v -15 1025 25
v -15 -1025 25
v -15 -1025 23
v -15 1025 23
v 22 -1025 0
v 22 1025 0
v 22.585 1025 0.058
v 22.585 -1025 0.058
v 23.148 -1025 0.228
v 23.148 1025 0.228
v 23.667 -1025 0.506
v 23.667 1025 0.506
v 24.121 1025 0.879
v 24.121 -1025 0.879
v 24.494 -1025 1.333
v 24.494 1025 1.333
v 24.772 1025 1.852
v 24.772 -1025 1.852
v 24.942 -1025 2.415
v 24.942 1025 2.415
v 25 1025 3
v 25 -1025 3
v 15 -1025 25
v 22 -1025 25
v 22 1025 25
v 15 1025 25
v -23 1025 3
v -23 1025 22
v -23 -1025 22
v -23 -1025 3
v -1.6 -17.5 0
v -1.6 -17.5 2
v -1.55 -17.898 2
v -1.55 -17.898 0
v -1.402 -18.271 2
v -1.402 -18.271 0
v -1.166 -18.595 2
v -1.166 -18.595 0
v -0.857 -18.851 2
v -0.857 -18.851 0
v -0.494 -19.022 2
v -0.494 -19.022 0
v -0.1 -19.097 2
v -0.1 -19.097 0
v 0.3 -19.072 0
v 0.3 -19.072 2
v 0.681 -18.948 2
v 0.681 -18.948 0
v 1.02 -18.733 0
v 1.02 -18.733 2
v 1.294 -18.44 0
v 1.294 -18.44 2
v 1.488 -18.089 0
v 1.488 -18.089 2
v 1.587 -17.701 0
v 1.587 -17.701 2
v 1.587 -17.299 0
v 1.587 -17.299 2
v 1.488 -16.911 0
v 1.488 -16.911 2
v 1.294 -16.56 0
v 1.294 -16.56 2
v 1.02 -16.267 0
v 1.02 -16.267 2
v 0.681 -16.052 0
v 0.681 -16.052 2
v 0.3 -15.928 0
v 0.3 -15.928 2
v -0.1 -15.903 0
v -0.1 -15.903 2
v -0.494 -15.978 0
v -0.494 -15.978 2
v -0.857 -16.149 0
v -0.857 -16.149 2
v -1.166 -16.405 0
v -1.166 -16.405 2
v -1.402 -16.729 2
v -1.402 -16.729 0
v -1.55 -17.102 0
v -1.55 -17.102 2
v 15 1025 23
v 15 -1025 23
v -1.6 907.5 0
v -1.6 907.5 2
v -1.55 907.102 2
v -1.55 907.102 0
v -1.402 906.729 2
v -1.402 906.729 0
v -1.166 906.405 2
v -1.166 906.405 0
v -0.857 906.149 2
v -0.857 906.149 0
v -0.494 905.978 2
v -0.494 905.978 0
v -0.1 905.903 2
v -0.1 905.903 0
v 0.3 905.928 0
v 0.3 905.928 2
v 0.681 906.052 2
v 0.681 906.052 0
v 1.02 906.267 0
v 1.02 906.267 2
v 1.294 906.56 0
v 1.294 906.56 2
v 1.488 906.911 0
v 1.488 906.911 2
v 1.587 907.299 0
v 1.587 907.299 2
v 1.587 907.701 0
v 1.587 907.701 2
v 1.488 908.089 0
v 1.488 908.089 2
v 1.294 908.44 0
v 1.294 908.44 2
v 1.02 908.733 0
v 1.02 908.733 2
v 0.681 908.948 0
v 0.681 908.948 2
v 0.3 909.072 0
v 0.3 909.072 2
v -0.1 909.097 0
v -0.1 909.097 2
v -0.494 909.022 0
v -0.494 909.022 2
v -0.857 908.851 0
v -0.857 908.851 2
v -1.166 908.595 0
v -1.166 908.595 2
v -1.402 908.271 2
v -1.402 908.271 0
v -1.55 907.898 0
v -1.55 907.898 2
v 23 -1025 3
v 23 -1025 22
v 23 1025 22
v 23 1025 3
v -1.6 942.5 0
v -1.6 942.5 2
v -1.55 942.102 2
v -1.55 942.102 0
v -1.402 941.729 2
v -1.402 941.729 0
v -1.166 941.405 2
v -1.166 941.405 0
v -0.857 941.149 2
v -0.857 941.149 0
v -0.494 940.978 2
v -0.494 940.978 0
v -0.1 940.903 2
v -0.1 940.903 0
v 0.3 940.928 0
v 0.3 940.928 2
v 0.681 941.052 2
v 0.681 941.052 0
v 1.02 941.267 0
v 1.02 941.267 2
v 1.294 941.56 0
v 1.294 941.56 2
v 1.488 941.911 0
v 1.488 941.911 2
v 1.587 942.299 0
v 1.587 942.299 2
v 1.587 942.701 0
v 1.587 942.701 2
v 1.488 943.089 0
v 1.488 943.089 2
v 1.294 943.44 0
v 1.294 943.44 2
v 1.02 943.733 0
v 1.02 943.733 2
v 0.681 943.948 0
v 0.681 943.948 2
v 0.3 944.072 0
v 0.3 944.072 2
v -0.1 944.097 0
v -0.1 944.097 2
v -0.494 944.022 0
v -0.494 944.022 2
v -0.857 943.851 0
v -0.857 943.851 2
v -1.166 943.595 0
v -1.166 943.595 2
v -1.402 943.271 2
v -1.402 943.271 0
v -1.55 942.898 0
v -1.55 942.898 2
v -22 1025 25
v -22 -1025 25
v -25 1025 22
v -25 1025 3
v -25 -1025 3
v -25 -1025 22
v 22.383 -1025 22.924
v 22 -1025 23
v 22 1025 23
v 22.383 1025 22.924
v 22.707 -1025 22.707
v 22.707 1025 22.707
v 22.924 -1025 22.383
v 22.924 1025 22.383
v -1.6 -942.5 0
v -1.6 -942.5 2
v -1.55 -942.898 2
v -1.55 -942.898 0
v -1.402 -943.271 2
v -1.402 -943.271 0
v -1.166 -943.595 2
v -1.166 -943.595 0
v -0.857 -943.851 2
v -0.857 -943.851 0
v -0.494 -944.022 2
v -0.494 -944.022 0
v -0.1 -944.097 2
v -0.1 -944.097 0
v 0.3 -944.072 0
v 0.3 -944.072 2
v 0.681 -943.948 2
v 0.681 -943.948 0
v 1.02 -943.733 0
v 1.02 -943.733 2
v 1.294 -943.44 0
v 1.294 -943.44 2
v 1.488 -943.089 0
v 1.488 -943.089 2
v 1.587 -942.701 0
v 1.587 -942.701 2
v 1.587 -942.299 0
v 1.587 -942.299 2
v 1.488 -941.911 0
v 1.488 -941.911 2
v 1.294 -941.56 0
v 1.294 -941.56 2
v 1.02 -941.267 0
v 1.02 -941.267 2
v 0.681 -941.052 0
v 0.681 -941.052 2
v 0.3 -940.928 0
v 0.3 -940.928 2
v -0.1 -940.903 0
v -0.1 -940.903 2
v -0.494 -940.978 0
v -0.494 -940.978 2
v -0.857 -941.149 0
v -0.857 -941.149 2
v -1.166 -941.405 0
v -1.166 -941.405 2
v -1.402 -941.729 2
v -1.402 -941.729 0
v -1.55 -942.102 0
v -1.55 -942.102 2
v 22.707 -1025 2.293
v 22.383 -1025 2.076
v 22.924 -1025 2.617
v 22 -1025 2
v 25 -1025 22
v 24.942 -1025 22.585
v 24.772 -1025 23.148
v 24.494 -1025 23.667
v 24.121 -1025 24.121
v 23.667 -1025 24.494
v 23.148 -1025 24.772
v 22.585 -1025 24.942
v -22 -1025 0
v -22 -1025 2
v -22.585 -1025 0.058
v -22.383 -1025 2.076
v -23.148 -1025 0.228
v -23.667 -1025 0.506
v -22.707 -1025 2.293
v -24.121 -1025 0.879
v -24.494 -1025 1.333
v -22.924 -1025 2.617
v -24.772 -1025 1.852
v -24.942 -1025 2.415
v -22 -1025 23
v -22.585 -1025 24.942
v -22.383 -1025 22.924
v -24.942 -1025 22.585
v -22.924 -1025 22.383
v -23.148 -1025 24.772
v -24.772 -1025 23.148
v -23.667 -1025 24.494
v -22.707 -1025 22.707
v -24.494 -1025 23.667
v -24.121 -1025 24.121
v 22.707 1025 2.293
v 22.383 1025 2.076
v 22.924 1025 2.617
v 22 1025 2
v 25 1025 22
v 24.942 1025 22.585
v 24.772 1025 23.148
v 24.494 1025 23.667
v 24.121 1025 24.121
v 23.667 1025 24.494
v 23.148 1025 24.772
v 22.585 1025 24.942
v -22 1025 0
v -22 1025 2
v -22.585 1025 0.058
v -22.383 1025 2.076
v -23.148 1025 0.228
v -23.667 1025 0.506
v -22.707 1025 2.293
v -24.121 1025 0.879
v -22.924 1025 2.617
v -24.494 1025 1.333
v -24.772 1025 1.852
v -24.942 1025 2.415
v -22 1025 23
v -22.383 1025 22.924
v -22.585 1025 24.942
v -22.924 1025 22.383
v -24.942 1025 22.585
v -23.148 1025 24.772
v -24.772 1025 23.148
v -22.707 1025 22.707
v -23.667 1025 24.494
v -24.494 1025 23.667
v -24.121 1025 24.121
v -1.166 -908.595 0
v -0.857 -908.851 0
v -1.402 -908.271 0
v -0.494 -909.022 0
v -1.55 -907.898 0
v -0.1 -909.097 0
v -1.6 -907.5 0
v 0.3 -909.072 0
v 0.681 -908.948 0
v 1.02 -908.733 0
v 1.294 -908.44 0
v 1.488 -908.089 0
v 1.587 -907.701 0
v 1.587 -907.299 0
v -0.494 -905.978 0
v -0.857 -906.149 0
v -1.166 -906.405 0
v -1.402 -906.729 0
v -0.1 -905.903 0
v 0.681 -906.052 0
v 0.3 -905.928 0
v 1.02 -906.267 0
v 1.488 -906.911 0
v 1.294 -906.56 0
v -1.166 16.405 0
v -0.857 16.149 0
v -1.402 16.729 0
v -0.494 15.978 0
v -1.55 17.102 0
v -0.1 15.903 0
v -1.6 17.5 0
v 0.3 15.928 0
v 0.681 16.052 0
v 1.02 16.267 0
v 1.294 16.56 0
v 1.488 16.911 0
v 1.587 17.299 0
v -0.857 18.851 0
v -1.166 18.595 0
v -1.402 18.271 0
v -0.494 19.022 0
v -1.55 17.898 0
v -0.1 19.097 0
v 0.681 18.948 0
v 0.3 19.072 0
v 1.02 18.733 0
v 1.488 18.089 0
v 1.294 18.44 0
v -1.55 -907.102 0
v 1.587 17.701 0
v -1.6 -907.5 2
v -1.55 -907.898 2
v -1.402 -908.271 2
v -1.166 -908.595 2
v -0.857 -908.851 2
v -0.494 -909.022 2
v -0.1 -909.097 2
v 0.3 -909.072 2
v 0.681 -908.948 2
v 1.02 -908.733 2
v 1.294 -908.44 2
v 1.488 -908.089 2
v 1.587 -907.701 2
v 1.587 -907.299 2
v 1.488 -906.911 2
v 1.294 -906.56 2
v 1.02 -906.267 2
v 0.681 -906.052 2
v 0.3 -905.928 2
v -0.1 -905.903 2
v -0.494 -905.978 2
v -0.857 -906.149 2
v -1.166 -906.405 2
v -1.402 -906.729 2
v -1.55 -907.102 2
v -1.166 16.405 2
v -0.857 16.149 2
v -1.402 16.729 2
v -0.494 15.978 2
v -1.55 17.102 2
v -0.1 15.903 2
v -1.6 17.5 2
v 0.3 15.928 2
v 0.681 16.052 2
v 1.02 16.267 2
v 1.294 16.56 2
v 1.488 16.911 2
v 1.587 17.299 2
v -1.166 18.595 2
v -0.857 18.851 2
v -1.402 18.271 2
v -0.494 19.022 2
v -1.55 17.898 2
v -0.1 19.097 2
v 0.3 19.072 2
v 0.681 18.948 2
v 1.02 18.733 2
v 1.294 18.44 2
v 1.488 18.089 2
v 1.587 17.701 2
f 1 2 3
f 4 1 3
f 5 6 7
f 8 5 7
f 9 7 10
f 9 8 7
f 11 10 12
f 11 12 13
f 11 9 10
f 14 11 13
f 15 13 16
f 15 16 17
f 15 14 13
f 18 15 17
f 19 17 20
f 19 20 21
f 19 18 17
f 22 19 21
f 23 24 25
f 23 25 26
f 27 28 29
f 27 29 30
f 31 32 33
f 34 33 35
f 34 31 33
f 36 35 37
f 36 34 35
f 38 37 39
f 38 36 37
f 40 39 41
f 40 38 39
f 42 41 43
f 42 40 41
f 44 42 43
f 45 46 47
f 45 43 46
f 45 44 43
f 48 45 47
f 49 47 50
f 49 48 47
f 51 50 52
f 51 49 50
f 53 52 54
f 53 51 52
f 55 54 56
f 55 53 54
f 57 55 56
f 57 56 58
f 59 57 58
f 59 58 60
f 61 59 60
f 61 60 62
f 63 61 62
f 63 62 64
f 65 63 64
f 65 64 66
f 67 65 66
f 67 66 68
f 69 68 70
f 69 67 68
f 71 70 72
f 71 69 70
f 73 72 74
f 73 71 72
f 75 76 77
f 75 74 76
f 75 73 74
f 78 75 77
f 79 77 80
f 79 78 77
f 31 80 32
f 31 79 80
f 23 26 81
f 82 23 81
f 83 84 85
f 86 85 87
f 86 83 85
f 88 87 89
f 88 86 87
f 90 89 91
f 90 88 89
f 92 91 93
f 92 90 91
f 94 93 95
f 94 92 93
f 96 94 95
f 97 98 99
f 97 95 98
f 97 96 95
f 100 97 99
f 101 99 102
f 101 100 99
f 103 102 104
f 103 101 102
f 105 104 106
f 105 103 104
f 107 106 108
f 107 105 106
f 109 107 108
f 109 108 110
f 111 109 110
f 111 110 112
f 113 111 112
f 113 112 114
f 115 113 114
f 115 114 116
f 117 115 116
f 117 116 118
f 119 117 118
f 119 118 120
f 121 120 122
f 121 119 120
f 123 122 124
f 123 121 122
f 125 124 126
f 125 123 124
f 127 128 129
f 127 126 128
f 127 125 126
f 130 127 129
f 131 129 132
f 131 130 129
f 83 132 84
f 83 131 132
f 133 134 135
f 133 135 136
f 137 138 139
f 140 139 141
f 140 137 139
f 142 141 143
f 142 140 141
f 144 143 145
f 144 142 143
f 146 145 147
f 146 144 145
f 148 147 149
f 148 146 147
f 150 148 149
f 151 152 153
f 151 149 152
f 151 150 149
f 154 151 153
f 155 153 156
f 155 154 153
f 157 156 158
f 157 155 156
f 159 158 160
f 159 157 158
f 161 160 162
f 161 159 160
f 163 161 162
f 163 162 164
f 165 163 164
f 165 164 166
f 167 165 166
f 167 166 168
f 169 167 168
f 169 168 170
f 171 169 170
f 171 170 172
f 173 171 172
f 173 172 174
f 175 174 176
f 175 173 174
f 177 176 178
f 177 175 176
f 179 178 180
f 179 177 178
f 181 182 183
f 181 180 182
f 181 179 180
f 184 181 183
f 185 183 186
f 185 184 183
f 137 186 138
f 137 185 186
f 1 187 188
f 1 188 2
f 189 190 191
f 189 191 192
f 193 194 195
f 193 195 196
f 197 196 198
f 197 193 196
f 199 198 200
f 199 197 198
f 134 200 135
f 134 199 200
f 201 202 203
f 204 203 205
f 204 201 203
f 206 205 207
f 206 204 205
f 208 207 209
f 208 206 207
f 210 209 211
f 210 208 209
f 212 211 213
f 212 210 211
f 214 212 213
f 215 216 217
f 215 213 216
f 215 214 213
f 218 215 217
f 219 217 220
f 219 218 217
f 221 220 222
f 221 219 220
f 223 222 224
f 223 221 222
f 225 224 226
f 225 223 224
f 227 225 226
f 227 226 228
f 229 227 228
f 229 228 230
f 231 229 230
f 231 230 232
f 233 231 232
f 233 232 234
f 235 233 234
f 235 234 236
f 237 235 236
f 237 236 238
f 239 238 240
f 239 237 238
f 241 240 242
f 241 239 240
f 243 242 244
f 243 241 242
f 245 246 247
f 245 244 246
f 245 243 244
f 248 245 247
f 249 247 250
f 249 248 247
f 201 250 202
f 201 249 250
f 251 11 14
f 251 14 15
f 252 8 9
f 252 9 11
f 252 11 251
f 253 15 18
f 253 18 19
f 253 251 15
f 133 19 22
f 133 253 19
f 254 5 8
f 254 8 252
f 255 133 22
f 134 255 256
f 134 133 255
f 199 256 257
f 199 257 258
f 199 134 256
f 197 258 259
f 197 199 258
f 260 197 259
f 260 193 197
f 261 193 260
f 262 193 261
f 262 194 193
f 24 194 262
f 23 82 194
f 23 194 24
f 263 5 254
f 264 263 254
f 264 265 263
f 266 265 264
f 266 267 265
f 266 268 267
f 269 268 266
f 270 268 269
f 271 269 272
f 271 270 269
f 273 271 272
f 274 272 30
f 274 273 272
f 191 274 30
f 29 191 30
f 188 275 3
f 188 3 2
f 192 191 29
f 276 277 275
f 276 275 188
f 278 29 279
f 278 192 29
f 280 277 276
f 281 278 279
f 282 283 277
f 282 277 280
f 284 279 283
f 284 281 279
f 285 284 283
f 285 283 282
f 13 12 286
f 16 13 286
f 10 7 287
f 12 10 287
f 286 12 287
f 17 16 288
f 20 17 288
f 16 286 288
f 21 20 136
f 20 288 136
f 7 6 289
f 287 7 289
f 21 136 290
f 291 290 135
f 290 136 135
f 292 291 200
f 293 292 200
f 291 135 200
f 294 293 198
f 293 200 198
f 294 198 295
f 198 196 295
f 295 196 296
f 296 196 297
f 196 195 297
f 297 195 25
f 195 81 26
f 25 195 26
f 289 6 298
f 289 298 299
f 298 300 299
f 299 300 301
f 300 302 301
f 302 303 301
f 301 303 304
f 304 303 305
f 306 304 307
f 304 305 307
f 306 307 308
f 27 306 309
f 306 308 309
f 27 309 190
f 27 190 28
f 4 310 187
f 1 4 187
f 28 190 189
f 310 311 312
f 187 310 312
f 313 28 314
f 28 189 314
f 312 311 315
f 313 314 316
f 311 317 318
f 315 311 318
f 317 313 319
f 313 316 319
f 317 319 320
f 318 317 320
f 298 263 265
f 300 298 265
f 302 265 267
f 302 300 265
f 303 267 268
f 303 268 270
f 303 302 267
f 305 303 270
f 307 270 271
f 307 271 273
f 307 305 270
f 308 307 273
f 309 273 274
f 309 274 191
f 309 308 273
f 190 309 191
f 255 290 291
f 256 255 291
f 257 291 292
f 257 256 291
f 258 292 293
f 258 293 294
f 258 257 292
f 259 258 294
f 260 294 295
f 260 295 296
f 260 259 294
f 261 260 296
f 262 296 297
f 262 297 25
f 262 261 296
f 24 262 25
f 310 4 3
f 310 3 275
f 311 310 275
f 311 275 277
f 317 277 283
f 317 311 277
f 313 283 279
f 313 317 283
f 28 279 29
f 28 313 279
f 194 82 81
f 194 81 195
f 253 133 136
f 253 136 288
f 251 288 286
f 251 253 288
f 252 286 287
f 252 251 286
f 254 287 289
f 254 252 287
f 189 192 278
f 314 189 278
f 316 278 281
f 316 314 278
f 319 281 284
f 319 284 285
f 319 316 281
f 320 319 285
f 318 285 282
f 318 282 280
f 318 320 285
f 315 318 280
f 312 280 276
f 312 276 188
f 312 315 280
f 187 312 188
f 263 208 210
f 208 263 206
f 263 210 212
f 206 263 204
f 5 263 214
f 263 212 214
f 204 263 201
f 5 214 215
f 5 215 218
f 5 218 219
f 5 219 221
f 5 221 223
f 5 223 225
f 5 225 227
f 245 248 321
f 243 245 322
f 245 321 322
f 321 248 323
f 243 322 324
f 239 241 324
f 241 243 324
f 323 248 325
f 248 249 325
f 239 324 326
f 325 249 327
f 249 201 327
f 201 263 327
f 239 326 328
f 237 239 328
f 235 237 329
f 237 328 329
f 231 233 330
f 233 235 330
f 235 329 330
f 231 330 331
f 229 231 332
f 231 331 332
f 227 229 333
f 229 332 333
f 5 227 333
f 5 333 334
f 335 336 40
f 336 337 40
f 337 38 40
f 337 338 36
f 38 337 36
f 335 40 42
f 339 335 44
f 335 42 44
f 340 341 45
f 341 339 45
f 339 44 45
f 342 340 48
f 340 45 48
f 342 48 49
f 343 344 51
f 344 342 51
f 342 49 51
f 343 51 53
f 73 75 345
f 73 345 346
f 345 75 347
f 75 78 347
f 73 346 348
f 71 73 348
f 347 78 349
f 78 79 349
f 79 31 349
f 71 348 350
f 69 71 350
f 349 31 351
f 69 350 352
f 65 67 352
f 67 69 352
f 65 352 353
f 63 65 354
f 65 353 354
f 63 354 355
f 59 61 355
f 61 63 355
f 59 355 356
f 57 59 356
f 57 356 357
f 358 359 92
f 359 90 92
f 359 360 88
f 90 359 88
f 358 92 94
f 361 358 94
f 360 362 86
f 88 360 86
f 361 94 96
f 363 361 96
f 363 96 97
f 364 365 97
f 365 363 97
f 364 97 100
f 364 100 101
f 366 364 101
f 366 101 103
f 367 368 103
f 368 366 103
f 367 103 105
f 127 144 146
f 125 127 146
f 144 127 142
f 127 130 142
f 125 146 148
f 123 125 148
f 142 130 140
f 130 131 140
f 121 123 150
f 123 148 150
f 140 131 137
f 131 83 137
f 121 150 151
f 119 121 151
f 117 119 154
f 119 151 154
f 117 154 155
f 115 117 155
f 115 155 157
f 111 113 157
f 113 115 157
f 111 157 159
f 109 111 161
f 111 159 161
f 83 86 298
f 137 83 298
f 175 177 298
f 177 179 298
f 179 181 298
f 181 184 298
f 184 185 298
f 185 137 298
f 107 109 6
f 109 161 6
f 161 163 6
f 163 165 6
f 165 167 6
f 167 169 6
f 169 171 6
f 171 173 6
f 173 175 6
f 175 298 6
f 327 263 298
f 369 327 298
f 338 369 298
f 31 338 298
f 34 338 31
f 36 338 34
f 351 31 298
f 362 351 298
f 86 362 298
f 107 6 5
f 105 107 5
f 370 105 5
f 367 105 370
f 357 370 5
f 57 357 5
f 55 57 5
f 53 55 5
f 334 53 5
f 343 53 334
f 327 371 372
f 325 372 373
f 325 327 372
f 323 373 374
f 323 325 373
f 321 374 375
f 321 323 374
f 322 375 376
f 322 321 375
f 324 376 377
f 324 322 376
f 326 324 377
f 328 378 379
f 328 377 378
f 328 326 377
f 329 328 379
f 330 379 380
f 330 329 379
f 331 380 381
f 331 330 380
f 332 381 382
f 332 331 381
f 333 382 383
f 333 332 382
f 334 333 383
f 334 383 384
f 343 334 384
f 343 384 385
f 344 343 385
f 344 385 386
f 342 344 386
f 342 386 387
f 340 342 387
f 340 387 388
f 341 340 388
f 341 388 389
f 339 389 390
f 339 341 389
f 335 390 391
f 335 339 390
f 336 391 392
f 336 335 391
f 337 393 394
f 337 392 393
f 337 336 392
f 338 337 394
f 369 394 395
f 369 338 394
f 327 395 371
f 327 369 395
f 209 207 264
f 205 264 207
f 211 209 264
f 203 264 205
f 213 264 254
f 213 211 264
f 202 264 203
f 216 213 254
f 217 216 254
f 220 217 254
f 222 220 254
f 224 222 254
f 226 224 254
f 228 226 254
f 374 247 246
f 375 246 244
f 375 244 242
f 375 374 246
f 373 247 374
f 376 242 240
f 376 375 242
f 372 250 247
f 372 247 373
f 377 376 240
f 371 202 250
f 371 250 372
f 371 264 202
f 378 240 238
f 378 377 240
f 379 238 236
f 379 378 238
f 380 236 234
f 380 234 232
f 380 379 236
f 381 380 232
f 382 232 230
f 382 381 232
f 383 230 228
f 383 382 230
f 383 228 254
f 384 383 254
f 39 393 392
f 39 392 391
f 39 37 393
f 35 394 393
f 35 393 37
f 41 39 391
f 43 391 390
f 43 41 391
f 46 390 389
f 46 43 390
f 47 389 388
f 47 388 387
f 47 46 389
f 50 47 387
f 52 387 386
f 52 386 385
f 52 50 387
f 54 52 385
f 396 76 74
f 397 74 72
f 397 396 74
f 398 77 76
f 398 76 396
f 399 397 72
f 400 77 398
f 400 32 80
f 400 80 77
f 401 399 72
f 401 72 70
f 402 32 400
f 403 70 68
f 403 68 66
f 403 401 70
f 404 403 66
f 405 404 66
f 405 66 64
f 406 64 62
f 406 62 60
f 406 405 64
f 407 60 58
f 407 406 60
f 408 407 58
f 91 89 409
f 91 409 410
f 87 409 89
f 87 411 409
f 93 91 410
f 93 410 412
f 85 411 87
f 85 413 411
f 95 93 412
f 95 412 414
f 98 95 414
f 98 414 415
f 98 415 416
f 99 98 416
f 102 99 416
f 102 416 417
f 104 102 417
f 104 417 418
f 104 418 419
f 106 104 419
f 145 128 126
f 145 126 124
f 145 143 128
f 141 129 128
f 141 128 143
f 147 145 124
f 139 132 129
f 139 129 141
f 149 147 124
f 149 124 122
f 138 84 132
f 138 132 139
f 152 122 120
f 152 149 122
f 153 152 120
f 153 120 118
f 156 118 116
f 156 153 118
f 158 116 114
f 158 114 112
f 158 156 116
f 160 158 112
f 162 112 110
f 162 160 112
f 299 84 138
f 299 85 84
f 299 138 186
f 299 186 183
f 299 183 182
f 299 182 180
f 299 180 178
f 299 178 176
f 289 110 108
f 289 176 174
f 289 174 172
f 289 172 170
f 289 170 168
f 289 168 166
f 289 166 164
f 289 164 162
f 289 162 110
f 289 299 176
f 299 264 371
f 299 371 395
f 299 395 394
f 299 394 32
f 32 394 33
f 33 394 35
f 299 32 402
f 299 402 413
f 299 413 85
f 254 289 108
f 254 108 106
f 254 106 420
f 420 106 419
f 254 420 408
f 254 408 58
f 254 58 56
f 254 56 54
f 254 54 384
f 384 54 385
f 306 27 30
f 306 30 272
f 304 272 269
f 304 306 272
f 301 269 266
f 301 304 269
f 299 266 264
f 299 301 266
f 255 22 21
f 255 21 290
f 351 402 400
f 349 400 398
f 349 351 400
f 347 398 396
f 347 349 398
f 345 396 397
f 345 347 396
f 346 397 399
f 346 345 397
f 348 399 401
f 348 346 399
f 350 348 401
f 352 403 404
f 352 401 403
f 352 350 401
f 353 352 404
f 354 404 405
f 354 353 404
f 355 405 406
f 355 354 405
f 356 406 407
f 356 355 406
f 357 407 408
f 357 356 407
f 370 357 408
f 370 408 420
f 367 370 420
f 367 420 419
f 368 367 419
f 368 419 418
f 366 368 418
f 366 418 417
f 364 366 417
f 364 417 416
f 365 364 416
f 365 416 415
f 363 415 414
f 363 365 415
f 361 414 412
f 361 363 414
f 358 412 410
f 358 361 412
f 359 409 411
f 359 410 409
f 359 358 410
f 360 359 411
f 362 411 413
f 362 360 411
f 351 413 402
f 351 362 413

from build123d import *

# Parameters (mm, degrees)
BASEFLANGE_W                   = 50
BASEFLANGE_H                   = 2050
BASE_FLANGE1_DEPTH             = 2
EDGE_FLANGE1_STRIP_W           = 10
EDGE_FLANGE1_STRIP_H           = 2
EDGE_FLANGE1_STRIP_CUT_DEPTH   = 2050
EDGE_FLANGE1_STRIP_2_W         = 10
EDGE_FLANGE1_STRIP_2_H         = 2
EDGE_FLANGE1_STRIP_CUT_2_DEPTH = 2050
EDGE_FLANGE1_DEPTH             = 2050
EDGE_FLANGE1_BEND_DEPTH        = 2050
EDGE_FLANGE2_STRIP_W           = 10
EDGE_FLANGE2_STRIP_H           = 2
EDGE_FLANGE2_STRIP_CUT_DEPTH   = 2050
EDGE_FLANGE2_STRIP_2_W         = 10
EDGE_FLANGE2_STRIP_2_H         = 2
EDGE_FLANGE2_STRIP_CUT_2_DEPTH = 2050
EDGE_FLANGE2_DEPTH             = 2050
EDGE_FLANGE2_BEND_DEPTH        = 2050
SKETCH18_R                     = 1.6
CUT_EXTRUDE1_DEPTH             = 1026.609574838


# Sheet-metal steps are written as plain solids
with BuildPart() as part:
    # BaseFlange → Base-Flange1 (new body)
    with BuildSketch(Plane.XY):
        Rectangle(BASEFLANGE_W, BASEFLANGE_H)
    extrude(amount=BASE_FLANGE1_DEPTH)

    # Edge-Flange1 strip (across the edge) → Edge-Flange1 strip cut (cut)
    with BuildSketch(Plane(origin=(25, -1025, 2), x_dir=(-1, 0, 0), z_dir=(0, 1, 0))):
        with Locations((-2, -1)):
            Rectangle(EDGE_FLANGE1_STRIP_W, EDGE_FLANGE1_STRIP_H)
    extrude(amount=EDGE_FLANGE1_STRIP_CUT_DEPTH, mode=Mode.SUBTRACT)

    # Edge-Flange1 strip 2 (across the edge) → Edge-Flange1 strip cut 2 (cut)
    with BuildSketch(Plane(origin=(-25, 1025, 2), x_dir=(1, 0, 0), z_dir=(0, -1, 0))):
        with Locations((-2, -1)):
            Rectangle(EDGE_FLANGE1_STRIP_2_W, EDGE_FLANGE1_STRIP_2_H)
    extrude(amount=EDGE_FLANGE1_STRIP_CUT_2_DEPTH, mode=Mode.SUBTRACT)

    # Edge-Flange1 section (across the edge) → Edge-Flange1 (add)
    with BuildSketch(Plane(origin=(25, -1025, 2), x_dir=(-1, 0, 0), z_dir=(0, 1, 0))):
        with BuildLine():
            Line((0, 1), (0, 23))
            Line((0, 23), (2, 23))
            Line((2, 23), (2, 1))
            ThreePointArc((2, 1), (2.292893219, 0.292893219), (3, 0))
            Line((3, 0), (3, -2))
            ThreePointArc((3, -2), (0.878679656, -1.121320344), (0, 1))
        make_face()
    extrude(amount=EDGE_FLANGE1_DEPTH)

    # Edge-Flange1 section 2 (across the edge) → Edge-Flange1 bend (add)
    with BuildSketch(Plane(origin=(-25, 1025, 2), x_dir=(1, 0, 0), z_dir=(0, -1, 0))):
        with BuildLine():
            Line((0, 1), (0, 23))
            Line((0, 23), (2, 23))
            Line((2, 23), (2, 1))
            ThreePointArc((2, 1), (2.292893219, 0.292893219), (3, 0))
            Line((3, 0), (3, -2))
            ThreePointArc((3, -2), (0.878679656, -1.121320344), (0, 1))
        make_face()
    extrude(amount=EDGE_FLANGE1_BEND_DEPTH)

    # Edge-Flange2 strip (across the edge) → Edge-Flange2 strip cut (cut)
    with BuildSketch(Plane(origin=(-23, 1025, 25), x_dir=(0, 0, -1), z_dir=(0, -1, 0))):
        with Locations((-2, -1)):
            Rectangle(EDGE_FLANGE2_STRIP_W, EDGE_FLANGE2_STRIP_H)
    extrude(amount=EDGE_FLANGE2_STRIP_CUT_DEPTH, mode=Mode.SUBTRACT)

    # Edge-Flange2 strip 2 (across the edge) → Edge-Flange2 strip cut 2 (cut)
    with BuildSketch(Plane(origin=(23, -1025, 25), x_dir=(0, 0, -1), z_dir=(0, 1, 0))):
        with Locations((-2, -1)):
            Rectangle(EDGE_FLANGE2_STRIP_2_W, EDGE_FLANGE2_STRIP_2_H)
    extrude(amount=EDGE_FLANGE2_STRIP_CUT_2_DEPTH, mode=Mode.SUBTRACT)

    # Edge-Flange2 section (across the edge) → Edge-Flange2 (add)
    with BuildSketch(Plane(origin=(-23, 1025, 25), x_dir=(0, 0, -1), z_dir=(0, -1, 0))):
        with BuildLine():
            Line((0, 1), (0, 8))
            Line((0, 8), (2, 8))
            Line((2, 8), (2, 1))
            ThreePointArc((2, 1), (2.292893219, 0.292893219), (3, 0))
            Line((3, 0), (3, -2))
            ThreePointArc((3, -2), (0.878679656, -1.121320344), (0, 1))
        make_face()
    extrude(amount=EDGE_FLANGE2_DEPTH)

    # Edge-Flange2 section 2 (across the edge) → Edge-Flange2 bend (add)
    with BuildSketch(Plane(origin=(23, -1025, 25), x_dir=(0, 0, -1), z_dir=(0, 1, 0))):
        with BuildLine():
            Line((0, 1), (0, 8))
            Line((0, 8), (2, 8))
            Line((2, 8), (2, 1))
            ThreePointArc((2, 1), (2.292893219, 0.292893219), (3, 0))
            Line((3, 0), (3, -2))
            ThreePointArc((3, -2), (0.878679656, -1.121320344), (0, 1))
        make_face()
    extrude(amount=EDGE_FLANGE2_BEND_DEPTH)

    # Sketch18 → Cut-Extrude1 (cut, through all)
    with BuildSketch(Plane.XY):
        with Locations(Location((0, -17.5, 0), (0, 0, 180))):
            Circle(SKETCH18_R)
        with Locations(Location((0, -942.5, 0), (0, 0, 180))):
            Circle(SKETCH18_R)
        with Locations(Location((0, 942.5, 0), (0, 0, 180))):
            Circle(SKETCH18_R)
        with Locations(Location((0, -907.5, 0), (0, 0, 180))):
            Circle(SKETCH18_R)
        with Locations(Location((0, 17.5, 0), (0, 0, 180))):
            Circle(SKETCH18_R)
        with Locations(Location((0, 907.5, 0), (0, 0, 180))):
            Circle(SKETCH18_R)
    extrude(amount=CUT_EXTRUDE1_DEPTH, mode=Mode.SUBTRACT)


solid = part.part
